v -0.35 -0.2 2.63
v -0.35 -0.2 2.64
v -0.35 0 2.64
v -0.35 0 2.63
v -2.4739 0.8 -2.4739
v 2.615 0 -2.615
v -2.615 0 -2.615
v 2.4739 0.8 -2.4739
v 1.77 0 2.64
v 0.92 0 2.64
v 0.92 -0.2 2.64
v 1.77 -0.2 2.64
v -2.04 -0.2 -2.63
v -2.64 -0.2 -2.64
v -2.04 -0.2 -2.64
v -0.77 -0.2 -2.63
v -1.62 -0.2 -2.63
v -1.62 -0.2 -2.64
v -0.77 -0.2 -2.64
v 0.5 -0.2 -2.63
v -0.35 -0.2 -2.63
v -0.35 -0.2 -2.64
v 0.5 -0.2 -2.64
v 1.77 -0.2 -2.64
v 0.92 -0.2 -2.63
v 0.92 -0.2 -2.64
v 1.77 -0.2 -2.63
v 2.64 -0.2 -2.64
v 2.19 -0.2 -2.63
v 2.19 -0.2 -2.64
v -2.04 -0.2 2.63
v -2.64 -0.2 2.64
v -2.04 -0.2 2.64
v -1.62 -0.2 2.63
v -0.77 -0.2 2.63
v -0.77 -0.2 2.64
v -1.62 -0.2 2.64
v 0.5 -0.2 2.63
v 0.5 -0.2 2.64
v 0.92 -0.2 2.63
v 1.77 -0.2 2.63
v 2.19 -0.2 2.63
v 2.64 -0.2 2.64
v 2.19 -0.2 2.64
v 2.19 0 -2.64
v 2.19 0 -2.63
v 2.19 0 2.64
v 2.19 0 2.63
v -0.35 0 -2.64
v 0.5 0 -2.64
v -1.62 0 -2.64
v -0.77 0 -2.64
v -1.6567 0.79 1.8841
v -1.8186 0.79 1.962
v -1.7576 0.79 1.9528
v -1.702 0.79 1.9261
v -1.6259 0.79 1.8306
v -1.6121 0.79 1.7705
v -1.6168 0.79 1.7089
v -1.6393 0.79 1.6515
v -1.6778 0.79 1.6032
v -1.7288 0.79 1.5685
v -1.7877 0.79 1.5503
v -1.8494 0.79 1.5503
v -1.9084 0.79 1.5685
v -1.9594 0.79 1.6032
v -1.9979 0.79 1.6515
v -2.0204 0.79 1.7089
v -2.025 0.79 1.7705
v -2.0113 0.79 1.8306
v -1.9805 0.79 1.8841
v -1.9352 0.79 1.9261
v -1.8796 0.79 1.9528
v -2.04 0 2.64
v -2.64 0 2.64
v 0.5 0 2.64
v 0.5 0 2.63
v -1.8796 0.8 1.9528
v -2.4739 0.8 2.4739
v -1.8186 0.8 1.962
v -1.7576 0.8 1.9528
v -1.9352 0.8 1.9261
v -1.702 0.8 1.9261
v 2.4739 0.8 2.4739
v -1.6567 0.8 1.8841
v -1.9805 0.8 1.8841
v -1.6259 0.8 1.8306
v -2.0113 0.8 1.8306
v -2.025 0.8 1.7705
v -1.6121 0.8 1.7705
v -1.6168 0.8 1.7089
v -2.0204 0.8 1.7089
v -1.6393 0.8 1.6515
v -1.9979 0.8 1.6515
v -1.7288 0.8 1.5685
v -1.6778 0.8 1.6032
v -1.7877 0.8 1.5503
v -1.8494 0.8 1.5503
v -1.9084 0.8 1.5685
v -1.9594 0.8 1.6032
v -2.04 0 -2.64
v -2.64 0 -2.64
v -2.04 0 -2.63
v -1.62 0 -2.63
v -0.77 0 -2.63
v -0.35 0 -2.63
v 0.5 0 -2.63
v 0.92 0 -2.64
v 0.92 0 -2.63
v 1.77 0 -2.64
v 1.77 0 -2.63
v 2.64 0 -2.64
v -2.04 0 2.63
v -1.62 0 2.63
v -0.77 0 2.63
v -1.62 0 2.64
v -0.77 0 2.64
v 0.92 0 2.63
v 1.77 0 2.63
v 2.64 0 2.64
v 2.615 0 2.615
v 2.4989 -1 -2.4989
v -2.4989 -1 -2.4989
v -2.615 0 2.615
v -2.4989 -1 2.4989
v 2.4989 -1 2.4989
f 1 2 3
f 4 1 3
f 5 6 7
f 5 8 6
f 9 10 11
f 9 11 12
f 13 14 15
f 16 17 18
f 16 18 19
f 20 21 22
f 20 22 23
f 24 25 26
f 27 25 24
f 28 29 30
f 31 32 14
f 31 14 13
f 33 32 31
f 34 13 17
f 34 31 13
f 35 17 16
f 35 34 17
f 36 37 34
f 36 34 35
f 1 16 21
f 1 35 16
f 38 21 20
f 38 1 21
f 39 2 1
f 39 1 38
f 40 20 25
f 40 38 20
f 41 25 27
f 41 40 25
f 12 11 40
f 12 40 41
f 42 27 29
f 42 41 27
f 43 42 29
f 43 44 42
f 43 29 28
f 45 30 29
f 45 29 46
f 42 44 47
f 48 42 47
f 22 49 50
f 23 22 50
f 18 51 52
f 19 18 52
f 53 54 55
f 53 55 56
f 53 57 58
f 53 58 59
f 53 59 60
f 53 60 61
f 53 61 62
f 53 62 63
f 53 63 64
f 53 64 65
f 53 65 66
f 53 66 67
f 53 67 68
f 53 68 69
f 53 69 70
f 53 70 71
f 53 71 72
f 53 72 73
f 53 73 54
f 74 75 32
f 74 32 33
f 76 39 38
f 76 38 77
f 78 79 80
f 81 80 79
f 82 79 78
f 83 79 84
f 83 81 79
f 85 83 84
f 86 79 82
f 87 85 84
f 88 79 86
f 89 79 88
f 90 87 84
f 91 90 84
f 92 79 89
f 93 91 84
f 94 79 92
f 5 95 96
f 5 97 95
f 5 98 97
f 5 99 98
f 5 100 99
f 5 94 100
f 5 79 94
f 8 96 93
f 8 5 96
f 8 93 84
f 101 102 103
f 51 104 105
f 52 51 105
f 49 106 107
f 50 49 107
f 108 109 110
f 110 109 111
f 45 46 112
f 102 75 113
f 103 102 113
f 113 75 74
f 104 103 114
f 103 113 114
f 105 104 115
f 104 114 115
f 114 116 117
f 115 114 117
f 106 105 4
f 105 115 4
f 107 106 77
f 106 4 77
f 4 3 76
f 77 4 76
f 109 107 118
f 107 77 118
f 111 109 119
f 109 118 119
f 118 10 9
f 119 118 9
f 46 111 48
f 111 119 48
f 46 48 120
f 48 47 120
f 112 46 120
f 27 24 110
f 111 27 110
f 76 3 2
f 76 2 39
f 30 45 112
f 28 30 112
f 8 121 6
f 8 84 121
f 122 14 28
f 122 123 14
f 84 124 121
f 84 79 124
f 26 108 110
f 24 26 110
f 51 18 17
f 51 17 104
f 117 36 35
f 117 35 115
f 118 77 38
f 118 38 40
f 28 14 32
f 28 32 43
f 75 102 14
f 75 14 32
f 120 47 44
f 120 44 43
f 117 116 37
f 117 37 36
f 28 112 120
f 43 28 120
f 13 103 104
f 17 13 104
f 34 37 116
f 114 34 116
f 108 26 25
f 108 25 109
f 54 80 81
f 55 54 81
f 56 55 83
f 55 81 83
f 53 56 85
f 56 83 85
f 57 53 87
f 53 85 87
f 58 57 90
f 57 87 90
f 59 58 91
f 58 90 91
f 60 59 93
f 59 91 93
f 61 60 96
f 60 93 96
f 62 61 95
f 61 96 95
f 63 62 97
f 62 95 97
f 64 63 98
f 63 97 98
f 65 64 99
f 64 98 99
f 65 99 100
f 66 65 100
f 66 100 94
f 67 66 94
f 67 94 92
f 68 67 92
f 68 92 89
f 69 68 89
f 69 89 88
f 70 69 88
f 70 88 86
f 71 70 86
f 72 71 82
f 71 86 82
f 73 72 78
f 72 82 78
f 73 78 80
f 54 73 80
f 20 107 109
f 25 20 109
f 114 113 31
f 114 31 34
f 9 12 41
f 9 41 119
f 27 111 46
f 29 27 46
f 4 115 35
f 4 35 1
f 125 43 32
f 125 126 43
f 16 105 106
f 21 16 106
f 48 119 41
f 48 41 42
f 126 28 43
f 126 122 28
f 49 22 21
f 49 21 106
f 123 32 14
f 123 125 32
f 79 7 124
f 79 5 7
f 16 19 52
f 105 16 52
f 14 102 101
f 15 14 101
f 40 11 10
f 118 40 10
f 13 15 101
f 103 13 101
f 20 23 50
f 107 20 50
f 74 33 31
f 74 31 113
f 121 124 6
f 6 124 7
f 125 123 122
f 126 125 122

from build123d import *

# Parameters (mm, degrees)
SKETCH3_W           = 5.23
SKETCH3_H           = 5.23
BOSS_EXTRUDE1_DEPTH = 0.8
BOSS_EXTRUDE1_TAPER = 10
SKETCH4_W           = 5.28
SKETCH4_H           = 5.28
BOSS_EXTRUDE2_DEPTH = 0.2
SKETCH5_W           = 5.28
SKETCH5_H           = 5.28
BOSS_EXTRUDE3_DEPTH = 0.8
BOSS_EXTRUDE3_TAPER = 10
SKETCH6_R           = 0.207024854
CUT_EXTRUDE1_DEPTH  = 0.01
SKETCH8_W           = 0.42
SKETCH8_H           = 0.2
CUT_EXTRUDE2_DEPTH  = 0.01


with BuildPart() as part:
    # Sketch3 → Boss-Extrude1 (new body)
    with BuildSketch(Plane(origin=(0, 0, 0), x_dir=(1, 0, 0), z_dir=(0, 1, 0))):
        Rectangle(SKETCH3_W, SKETCH3_H)
    extrude(amount=BOSS_EXTRUDE1_DEPTH, taper=BOSS_EXTRUDE1_TAPER)

    # Sketch6 → Cut-Extrude1 (cut)
    with BuildSketch(Plane(origin=(0, 0.8, 0), x_dir=(1, 0, 0), z_dir=(0, 1, 0))):
        with Locations(Location((-1.818593304, -1.755006126, 0), (0, 0, 270))):
            Circle(SKETCH6_R)
    extrude(amount=-CUT_EXTRUDE1_DEPTH, mode=Mode.SUBTRACT)


with BuildPart() as body_2:
    # Sketch4 → Boss-Extrude2 (new body)
    with BuildSketch(Plane.XZ):
        Rectangle(SKETCH4_W, SKETCH4_H)
    extrude(amount=BOSS_EXTRUDE2_DEPTH)

    # Sketch8 → Cut-Extrude2 (cut)
    with BuildSketch(Plane.XY.offset(2.64)):
        with Locations((-1.83, -0.1)):
            Rectangle(SKETCH8_W, SKETCH8_H)
        with Locations((-0.56, -0.1)):
            Rectangle(SKETCH8_W, SKETCH8_H)
        with Locations((0.71, -0.1)):
            Rectangle(SKETCH8_W, SKETCH8_H)
        with Locations((1.98, -0.1)):
            Rectangle(SKETCH8_W, SKETCH8_H)
    cut_extrude2 = extrude(amount=-CUT_EXTRUDE2_DEPTH, mode=Mode.SUBTRACT)

    # Mirror1: Cut-Extrude2 across plane
    add(cut_extrude2.mirror(Plane.XY), mode=Mode.SUBTRACT)


with BuildPart() as body_3:
    # Sketch5 → Boss-Extrude3 (new body)
    with BuildSketch(Plane.XZ.offset(0.2)):
        Rectangle(SKETCH5_W, SKETCH5_H)
    extrude(amount=BOSS_EXTRUDE3_DEPTH, taper=BOSS_EXTRUDE3_TAPER)


solid = Compound([part.part, body_2.part, body_3.part])
